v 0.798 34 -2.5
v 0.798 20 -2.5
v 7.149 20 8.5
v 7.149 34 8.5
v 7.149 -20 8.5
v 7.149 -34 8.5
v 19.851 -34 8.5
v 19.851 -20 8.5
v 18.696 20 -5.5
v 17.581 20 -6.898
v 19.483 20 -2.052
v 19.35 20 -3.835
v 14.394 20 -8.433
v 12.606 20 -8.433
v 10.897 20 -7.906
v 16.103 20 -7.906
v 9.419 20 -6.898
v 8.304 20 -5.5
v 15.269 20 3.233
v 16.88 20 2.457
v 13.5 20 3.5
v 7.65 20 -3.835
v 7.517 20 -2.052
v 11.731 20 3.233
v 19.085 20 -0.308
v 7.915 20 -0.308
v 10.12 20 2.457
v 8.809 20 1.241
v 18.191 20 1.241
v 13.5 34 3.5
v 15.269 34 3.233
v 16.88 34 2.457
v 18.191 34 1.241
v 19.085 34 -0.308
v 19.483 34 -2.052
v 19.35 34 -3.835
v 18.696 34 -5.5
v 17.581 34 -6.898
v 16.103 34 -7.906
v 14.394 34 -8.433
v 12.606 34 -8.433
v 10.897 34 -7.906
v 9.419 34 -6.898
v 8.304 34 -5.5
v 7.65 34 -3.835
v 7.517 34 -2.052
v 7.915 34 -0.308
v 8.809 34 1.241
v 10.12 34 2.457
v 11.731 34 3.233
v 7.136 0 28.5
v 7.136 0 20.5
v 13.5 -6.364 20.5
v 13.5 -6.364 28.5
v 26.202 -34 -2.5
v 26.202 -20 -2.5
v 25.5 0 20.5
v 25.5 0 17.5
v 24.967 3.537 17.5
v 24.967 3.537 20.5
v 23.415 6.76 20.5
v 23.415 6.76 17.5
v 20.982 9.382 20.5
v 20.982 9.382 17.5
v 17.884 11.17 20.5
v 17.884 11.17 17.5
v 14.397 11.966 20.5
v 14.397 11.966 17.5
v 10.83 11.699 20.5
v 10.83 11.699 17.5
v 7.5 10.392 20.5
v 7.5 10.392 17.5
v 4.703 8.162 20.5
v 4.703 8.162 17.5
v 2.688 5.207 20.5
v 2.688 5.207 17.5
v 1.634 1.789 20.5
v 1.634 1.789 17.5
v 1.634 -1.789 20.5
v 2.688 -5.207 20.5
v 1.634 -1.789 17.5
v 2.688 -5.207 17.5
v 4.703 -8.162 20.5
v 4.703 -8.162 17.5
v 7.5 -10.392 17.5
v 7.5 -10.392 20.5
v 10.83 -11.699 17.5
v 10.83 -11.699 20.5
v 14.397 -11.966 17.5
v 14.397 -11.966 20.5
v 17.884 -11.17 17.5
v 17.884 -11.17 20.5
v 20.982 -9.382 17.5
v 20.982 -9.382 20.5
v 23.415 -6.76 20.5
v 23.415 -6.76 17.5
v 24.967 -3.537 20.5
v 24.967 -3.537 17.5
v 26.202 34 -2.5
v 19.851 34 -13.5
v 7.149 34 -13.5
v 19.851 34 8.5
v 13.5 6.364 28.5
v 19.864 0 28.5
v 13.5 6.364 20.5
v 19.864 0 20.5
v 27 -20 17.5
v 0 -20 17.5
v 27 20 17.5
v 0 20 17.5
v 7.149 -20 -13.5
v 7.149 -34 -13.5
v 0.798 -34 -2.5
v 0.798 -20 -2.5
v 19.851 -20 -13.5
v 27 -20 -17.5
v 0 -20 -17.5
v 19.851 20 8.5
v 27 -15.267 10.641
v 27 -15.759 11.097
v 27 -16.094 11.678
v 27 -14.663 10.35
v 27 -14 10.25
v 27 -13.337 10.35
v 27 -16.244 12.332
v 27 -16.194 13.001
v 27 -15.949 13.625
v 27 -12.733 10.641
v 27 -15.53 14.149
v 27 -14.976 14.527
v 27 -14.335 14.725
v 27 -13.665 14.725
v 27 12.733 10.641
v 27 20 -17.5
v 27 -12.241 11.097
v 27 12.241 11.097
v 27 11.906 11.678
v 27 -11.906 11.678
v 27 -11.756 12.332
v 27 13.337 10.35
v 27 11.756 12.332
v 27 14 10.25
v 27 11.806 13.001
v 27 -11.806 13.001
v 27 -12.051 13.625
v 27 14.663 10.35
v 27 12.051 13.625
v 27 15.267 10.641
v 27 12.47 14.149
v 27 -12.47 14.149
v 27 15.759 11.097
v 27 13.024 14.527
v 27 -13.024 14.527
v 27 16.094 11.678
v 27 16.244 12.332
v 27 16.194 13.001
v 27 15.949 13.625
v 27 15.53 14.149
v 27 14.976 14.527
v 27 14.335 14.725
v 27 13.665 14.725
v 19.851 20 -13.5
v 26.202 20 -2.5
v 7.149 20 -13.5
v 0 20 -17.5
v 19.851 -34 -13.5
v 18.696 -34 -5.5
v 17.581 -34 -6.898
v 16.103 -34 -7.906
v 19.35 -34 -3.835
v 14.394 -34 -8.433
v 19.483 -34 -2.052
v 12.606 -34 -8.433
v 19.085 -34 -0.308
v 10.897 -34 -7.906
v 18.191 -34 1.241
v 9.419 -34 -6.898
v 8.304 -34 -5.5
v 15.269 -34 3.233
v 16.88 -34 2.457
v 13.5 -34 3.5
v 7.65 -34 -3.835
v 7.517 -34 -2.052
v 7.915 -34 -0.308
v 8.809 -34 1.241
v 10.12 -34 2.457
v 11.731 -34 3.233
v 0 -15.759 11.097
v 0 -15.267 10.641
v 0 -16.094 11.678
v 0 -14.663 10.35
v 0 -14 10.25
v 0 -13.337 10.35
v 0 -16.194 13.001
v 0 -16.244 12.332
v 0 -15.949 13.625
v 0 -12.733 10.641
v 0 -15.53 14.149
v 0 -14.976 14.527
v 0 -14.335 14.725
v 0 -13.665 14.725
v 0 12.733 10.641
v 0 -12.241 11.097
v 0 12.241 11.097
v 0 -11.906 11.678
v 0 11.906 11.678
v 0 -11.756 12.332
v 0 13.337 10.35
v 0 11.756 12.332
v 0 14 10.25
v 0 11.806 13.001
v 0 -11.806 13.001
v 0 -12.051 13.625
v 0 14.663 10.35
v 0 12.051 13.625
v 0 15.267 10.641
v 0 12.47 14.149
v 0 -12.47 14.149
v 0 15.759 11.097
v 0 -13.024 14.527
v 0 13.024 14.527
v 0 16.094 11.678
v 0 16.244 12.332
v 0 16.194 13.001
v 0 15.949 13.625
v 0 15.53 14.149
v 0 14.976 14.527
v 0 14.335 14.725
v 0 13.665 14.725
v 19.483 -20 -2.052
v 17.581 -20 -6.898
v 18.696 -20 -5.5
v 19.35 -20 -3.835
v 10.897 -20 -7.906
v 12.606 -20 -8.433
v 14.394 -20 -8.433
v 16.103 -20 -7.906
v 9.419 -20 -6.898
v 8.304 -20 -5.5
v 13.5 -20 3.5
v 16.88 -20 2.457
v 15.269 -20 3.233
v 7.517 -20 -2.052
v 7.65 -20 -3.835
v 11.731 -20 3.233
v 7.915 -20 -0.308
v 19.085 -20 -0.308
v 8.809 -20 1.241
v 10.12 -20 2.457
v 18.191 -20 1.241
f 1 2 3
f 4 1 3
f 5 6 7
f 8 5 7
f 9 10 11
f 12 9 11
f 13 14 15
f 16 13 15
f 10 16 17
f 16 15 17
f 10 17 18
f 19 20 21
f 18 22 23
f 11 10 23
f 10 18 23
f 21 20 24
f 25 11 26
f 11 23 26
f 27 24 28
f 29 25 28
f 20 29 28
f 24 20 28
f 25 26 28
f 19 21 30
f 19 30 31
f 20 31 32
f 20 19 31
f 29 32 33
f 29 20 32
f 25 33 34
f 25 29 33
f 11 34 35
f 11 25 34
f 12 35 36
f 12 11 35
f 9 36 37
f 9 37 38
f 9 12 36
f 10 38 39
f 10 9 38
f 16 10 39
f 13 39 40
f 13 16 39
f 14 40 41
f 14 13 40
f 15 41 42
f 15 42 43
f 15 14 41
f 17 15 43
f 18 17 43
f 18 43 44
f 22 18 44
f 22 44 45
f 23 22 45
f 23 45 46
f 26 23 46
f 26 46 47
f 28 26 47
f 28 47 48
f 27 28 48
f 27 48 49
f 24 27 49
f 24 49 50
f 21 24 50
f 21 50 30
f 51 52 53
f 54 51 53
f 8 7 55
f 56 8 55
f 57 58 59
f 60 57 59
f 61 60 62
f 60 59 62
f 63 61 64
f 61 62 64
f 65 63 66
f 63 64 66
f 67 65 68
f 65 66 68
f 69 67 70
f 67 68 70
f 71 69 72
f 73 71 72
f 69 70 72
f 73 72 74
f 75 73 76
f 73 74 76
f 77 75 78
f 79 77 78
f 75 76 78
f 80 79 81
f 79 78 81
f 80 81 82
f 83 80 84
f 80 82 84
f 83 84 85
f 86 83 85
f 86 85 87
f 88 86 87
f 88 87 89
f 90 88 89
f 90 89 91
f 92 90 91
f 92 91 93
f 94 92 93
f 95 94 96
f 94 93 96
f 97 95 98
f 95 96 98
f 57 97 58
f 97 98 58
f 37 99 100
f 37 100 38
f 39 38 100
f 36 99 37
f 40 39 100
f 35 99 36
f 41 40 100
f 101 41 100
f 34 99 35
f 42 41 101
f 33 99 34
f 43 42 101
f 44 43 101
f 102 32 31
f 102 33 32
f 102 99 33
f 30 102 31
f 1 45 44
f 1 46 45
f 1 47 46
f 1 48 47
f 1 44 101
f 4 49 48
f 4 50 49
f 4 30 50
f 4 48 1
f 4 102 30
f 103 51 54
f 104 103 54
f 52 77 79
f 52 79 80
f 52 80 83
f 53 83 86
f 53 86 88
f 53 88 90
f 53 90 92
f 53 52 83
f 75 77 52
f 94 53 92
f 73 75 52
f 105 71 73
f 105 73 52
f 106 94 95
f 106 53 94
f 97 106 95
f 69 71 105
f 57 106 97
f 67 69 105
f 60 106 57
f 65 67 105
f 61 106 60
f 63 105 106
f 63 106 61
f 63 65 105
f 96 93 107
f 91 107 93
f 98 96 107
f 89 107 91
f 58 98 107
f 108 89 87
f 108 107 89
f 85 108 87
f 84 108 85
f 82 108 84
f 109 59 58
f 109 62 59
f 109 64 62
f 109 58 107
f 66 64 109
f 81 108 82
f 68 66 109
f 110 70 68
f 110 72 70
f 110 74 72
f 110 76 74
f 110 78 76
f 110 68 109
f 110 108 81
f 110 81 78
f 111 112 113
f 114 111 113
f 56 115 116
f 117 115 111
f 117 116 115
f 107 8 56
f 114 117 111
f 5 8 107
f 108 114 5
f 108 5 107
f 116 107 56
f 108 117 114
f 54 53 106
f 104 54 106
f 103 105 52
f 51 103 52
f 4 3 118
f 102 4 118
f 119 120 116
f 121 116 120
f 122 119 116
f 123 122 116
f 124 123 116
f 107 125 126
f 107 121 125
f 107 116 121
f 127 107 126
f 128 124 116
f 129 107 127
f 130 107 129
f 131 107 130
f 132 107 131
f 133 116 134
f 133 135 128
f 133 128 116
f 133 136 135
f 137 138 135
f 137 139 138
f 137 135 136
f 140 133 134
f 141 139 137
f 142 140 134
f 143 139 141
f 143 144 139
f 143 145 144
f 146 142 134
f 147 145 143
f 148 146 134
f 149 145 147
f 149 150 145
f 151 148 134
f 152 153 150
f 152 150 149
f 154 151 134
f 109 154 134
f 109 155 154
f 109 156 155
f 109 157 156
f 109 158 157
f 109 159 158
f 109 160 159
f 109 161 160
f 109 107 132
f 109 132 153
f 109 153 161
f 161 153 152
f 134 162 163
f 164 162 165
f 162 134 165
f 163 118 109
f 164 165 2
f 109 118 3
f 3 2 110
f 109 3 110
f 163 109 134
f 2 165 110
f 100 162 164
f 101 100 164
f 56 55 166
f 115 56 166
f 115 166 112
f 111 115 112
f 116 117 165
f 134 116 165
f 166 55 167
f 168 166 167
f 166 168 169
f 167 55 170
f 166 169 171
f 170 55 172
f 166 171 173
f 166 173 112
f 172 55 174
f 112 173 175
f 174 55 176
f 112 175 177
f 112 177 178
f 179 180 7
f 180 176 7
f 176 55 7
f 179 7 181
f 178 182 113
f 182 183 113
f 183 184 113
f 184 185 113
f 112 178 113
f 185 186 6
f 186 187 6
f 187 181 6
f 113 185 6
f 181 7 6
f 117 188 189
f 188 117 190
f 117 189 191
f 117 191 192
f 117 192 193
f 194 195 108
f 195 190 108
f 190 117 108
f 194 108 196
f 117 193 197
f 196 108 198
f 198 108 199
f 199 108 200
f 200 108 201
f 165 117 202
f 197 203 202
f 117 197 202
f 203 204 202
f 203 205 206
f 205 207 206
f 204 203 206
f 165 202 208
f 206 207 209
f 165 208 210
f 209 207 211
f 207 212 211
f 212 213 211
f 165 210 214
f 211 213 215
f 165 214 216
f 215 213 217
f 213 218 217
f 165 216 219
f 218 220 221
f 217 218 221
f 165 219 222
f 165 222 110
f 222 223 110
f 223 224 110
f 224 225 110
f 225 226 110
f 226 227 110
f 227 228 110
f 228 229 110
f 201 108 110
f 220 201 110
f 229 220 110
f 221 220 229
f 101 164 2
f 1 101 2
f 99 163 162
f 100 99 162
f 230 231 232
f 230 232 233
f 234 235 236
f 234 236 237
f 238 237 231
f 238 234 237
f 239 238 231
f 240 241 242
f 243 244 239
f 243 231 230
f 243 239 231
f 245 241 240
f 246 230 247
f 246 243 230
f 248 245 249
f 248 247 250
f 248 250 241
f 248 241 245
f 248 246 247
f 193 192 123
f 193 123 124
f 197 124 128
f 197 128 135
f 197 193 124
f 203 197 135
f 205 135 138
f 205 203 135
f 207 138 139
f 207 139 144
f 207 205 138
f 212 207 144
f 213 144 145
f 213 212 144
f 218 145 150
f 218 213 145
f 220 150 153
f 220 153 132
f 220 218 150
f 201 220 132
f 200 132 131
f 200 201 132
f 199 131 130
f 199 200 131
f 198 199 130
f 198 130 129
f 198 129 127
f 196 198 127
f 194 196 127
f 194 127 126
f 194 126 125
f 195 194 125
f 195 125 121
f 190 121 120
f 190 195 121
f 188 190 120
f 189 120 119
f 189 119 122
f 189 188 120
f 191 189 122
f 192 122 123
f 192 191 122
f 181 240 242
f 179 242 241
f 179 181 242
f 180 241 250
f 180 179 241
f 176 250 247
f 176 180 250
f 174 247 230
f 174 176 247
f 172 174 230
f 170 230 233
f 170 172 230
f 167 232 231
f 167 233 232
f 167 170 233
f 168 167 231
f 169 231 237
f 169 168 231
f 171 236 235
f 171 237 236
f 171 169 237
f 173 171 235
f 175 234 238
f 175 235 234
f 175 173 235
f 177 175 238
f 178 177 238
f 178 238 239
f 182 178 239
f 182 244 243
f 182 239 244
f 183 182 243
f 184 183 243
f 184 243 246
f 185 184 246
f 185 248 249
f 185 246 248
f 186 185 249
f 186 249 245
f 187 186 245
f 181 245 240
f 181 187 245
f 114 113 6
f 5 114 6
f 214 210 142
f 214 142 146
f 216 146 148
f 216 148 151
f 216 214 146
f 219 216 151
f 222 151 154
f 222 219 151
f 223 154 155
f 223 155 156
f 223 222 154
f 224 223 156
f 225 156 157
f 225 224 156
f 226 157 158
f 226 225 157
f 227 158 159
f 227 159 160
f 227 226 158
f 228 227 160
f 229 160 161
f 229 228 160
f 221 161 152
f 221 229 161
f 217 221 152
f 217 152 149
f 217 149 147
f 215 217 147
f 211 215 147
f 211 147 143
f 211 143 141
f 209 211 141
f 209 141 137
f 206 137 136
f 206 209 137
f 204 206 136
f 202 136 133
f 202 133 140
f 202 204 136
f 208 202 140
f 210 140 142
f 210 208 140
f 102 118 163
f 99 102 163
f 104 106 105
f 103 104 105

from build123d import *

# Parameters (mm, degrees)
SKETCH1_W                = 40
SKETCH1_H                = 35
SKETCH1_R                = 2.25
BOSS_EXTRUDE1_DEPTH      = 27
BOSS_EXTRUDE2_DEPTH      = 14
BOSS_EXTRUDE2_DEPTH_BACK = 54
SKETCH2_R                = 6
SKETCH3_R                = 12
BOSS_EXTRUDE3_DEPTH      = 3
BOSS_EXTRUDE4_DEPTH      = 8


with BuildPart() as part:
    # Sketch1 → Boss-Extrude1 (new body)
    with BuildSketch(Plane.YZ):
        Rectangle(SKETCH1_W, SKETCH1_H)
        with Locations(Location((-14, 12.5, 0), (0, 0, 270))):
            Circle(SKETCH1_R, mode=Mode.SUBTRACT)
        with Locations(Location((14, 12.5, 0), (0, 0, 270))):
            Circle(SKETCH1_R, mode=Mode.SUBTRACT)
    extrude(amount=BOSS_EXTRUDE1_DEPTH)

    # Sketch2 → Boss-Extrude2 (add, two sides: drawn at the far end of the back side and taken through both)
    with BuildSketch(Plane(origin=(0, 20, 0), x_dir=(-1, 0, 0), z_dir=(0, 1, 0)).offset(-BOSS_EXTRUDE2_DEPTH_BACK)):
        Polygon((-0.798294078, -2.5), (-7.149147039, 8.5), (-19.850852961, 8.5), (-26.201705922, -2.5), (-19.850852961, -13.5), (-7.149147039, -13.5), align=None)
        with Locations(Location((-13.5, -2.5, 0), (0, 0, 90))):
            Circle(SKETCH2_R, mode=Mode.SUBTRACT)
    extrude(amount=BOSS_EXTRUDE2_DEPTH + BOSS_EXTRUDE2_DEPTH_BACK)

    # Sketch3 → Boss-Extrude3 (add)
    with BuildSketch(Plane.XY.offset(17.5)):
        with Locations((13.5, 0)):
            Circle(SKETCH3_R)
    extrude(amount=BOSS_EXTRUDE3_DEPTH)

    # Sketch4 → Boss-Extrude4 (add)
    with BuildSketch(Plane.XY.offset(20.5)):
        Polygon((13.5, 6.363961031), (7.136038969, 0), (13.5, -6.363961031), (19.863961031, 0), align=None)
    extrude(amount=BOSS_EXTRUDE4_DEPTH)


solid = part.part
